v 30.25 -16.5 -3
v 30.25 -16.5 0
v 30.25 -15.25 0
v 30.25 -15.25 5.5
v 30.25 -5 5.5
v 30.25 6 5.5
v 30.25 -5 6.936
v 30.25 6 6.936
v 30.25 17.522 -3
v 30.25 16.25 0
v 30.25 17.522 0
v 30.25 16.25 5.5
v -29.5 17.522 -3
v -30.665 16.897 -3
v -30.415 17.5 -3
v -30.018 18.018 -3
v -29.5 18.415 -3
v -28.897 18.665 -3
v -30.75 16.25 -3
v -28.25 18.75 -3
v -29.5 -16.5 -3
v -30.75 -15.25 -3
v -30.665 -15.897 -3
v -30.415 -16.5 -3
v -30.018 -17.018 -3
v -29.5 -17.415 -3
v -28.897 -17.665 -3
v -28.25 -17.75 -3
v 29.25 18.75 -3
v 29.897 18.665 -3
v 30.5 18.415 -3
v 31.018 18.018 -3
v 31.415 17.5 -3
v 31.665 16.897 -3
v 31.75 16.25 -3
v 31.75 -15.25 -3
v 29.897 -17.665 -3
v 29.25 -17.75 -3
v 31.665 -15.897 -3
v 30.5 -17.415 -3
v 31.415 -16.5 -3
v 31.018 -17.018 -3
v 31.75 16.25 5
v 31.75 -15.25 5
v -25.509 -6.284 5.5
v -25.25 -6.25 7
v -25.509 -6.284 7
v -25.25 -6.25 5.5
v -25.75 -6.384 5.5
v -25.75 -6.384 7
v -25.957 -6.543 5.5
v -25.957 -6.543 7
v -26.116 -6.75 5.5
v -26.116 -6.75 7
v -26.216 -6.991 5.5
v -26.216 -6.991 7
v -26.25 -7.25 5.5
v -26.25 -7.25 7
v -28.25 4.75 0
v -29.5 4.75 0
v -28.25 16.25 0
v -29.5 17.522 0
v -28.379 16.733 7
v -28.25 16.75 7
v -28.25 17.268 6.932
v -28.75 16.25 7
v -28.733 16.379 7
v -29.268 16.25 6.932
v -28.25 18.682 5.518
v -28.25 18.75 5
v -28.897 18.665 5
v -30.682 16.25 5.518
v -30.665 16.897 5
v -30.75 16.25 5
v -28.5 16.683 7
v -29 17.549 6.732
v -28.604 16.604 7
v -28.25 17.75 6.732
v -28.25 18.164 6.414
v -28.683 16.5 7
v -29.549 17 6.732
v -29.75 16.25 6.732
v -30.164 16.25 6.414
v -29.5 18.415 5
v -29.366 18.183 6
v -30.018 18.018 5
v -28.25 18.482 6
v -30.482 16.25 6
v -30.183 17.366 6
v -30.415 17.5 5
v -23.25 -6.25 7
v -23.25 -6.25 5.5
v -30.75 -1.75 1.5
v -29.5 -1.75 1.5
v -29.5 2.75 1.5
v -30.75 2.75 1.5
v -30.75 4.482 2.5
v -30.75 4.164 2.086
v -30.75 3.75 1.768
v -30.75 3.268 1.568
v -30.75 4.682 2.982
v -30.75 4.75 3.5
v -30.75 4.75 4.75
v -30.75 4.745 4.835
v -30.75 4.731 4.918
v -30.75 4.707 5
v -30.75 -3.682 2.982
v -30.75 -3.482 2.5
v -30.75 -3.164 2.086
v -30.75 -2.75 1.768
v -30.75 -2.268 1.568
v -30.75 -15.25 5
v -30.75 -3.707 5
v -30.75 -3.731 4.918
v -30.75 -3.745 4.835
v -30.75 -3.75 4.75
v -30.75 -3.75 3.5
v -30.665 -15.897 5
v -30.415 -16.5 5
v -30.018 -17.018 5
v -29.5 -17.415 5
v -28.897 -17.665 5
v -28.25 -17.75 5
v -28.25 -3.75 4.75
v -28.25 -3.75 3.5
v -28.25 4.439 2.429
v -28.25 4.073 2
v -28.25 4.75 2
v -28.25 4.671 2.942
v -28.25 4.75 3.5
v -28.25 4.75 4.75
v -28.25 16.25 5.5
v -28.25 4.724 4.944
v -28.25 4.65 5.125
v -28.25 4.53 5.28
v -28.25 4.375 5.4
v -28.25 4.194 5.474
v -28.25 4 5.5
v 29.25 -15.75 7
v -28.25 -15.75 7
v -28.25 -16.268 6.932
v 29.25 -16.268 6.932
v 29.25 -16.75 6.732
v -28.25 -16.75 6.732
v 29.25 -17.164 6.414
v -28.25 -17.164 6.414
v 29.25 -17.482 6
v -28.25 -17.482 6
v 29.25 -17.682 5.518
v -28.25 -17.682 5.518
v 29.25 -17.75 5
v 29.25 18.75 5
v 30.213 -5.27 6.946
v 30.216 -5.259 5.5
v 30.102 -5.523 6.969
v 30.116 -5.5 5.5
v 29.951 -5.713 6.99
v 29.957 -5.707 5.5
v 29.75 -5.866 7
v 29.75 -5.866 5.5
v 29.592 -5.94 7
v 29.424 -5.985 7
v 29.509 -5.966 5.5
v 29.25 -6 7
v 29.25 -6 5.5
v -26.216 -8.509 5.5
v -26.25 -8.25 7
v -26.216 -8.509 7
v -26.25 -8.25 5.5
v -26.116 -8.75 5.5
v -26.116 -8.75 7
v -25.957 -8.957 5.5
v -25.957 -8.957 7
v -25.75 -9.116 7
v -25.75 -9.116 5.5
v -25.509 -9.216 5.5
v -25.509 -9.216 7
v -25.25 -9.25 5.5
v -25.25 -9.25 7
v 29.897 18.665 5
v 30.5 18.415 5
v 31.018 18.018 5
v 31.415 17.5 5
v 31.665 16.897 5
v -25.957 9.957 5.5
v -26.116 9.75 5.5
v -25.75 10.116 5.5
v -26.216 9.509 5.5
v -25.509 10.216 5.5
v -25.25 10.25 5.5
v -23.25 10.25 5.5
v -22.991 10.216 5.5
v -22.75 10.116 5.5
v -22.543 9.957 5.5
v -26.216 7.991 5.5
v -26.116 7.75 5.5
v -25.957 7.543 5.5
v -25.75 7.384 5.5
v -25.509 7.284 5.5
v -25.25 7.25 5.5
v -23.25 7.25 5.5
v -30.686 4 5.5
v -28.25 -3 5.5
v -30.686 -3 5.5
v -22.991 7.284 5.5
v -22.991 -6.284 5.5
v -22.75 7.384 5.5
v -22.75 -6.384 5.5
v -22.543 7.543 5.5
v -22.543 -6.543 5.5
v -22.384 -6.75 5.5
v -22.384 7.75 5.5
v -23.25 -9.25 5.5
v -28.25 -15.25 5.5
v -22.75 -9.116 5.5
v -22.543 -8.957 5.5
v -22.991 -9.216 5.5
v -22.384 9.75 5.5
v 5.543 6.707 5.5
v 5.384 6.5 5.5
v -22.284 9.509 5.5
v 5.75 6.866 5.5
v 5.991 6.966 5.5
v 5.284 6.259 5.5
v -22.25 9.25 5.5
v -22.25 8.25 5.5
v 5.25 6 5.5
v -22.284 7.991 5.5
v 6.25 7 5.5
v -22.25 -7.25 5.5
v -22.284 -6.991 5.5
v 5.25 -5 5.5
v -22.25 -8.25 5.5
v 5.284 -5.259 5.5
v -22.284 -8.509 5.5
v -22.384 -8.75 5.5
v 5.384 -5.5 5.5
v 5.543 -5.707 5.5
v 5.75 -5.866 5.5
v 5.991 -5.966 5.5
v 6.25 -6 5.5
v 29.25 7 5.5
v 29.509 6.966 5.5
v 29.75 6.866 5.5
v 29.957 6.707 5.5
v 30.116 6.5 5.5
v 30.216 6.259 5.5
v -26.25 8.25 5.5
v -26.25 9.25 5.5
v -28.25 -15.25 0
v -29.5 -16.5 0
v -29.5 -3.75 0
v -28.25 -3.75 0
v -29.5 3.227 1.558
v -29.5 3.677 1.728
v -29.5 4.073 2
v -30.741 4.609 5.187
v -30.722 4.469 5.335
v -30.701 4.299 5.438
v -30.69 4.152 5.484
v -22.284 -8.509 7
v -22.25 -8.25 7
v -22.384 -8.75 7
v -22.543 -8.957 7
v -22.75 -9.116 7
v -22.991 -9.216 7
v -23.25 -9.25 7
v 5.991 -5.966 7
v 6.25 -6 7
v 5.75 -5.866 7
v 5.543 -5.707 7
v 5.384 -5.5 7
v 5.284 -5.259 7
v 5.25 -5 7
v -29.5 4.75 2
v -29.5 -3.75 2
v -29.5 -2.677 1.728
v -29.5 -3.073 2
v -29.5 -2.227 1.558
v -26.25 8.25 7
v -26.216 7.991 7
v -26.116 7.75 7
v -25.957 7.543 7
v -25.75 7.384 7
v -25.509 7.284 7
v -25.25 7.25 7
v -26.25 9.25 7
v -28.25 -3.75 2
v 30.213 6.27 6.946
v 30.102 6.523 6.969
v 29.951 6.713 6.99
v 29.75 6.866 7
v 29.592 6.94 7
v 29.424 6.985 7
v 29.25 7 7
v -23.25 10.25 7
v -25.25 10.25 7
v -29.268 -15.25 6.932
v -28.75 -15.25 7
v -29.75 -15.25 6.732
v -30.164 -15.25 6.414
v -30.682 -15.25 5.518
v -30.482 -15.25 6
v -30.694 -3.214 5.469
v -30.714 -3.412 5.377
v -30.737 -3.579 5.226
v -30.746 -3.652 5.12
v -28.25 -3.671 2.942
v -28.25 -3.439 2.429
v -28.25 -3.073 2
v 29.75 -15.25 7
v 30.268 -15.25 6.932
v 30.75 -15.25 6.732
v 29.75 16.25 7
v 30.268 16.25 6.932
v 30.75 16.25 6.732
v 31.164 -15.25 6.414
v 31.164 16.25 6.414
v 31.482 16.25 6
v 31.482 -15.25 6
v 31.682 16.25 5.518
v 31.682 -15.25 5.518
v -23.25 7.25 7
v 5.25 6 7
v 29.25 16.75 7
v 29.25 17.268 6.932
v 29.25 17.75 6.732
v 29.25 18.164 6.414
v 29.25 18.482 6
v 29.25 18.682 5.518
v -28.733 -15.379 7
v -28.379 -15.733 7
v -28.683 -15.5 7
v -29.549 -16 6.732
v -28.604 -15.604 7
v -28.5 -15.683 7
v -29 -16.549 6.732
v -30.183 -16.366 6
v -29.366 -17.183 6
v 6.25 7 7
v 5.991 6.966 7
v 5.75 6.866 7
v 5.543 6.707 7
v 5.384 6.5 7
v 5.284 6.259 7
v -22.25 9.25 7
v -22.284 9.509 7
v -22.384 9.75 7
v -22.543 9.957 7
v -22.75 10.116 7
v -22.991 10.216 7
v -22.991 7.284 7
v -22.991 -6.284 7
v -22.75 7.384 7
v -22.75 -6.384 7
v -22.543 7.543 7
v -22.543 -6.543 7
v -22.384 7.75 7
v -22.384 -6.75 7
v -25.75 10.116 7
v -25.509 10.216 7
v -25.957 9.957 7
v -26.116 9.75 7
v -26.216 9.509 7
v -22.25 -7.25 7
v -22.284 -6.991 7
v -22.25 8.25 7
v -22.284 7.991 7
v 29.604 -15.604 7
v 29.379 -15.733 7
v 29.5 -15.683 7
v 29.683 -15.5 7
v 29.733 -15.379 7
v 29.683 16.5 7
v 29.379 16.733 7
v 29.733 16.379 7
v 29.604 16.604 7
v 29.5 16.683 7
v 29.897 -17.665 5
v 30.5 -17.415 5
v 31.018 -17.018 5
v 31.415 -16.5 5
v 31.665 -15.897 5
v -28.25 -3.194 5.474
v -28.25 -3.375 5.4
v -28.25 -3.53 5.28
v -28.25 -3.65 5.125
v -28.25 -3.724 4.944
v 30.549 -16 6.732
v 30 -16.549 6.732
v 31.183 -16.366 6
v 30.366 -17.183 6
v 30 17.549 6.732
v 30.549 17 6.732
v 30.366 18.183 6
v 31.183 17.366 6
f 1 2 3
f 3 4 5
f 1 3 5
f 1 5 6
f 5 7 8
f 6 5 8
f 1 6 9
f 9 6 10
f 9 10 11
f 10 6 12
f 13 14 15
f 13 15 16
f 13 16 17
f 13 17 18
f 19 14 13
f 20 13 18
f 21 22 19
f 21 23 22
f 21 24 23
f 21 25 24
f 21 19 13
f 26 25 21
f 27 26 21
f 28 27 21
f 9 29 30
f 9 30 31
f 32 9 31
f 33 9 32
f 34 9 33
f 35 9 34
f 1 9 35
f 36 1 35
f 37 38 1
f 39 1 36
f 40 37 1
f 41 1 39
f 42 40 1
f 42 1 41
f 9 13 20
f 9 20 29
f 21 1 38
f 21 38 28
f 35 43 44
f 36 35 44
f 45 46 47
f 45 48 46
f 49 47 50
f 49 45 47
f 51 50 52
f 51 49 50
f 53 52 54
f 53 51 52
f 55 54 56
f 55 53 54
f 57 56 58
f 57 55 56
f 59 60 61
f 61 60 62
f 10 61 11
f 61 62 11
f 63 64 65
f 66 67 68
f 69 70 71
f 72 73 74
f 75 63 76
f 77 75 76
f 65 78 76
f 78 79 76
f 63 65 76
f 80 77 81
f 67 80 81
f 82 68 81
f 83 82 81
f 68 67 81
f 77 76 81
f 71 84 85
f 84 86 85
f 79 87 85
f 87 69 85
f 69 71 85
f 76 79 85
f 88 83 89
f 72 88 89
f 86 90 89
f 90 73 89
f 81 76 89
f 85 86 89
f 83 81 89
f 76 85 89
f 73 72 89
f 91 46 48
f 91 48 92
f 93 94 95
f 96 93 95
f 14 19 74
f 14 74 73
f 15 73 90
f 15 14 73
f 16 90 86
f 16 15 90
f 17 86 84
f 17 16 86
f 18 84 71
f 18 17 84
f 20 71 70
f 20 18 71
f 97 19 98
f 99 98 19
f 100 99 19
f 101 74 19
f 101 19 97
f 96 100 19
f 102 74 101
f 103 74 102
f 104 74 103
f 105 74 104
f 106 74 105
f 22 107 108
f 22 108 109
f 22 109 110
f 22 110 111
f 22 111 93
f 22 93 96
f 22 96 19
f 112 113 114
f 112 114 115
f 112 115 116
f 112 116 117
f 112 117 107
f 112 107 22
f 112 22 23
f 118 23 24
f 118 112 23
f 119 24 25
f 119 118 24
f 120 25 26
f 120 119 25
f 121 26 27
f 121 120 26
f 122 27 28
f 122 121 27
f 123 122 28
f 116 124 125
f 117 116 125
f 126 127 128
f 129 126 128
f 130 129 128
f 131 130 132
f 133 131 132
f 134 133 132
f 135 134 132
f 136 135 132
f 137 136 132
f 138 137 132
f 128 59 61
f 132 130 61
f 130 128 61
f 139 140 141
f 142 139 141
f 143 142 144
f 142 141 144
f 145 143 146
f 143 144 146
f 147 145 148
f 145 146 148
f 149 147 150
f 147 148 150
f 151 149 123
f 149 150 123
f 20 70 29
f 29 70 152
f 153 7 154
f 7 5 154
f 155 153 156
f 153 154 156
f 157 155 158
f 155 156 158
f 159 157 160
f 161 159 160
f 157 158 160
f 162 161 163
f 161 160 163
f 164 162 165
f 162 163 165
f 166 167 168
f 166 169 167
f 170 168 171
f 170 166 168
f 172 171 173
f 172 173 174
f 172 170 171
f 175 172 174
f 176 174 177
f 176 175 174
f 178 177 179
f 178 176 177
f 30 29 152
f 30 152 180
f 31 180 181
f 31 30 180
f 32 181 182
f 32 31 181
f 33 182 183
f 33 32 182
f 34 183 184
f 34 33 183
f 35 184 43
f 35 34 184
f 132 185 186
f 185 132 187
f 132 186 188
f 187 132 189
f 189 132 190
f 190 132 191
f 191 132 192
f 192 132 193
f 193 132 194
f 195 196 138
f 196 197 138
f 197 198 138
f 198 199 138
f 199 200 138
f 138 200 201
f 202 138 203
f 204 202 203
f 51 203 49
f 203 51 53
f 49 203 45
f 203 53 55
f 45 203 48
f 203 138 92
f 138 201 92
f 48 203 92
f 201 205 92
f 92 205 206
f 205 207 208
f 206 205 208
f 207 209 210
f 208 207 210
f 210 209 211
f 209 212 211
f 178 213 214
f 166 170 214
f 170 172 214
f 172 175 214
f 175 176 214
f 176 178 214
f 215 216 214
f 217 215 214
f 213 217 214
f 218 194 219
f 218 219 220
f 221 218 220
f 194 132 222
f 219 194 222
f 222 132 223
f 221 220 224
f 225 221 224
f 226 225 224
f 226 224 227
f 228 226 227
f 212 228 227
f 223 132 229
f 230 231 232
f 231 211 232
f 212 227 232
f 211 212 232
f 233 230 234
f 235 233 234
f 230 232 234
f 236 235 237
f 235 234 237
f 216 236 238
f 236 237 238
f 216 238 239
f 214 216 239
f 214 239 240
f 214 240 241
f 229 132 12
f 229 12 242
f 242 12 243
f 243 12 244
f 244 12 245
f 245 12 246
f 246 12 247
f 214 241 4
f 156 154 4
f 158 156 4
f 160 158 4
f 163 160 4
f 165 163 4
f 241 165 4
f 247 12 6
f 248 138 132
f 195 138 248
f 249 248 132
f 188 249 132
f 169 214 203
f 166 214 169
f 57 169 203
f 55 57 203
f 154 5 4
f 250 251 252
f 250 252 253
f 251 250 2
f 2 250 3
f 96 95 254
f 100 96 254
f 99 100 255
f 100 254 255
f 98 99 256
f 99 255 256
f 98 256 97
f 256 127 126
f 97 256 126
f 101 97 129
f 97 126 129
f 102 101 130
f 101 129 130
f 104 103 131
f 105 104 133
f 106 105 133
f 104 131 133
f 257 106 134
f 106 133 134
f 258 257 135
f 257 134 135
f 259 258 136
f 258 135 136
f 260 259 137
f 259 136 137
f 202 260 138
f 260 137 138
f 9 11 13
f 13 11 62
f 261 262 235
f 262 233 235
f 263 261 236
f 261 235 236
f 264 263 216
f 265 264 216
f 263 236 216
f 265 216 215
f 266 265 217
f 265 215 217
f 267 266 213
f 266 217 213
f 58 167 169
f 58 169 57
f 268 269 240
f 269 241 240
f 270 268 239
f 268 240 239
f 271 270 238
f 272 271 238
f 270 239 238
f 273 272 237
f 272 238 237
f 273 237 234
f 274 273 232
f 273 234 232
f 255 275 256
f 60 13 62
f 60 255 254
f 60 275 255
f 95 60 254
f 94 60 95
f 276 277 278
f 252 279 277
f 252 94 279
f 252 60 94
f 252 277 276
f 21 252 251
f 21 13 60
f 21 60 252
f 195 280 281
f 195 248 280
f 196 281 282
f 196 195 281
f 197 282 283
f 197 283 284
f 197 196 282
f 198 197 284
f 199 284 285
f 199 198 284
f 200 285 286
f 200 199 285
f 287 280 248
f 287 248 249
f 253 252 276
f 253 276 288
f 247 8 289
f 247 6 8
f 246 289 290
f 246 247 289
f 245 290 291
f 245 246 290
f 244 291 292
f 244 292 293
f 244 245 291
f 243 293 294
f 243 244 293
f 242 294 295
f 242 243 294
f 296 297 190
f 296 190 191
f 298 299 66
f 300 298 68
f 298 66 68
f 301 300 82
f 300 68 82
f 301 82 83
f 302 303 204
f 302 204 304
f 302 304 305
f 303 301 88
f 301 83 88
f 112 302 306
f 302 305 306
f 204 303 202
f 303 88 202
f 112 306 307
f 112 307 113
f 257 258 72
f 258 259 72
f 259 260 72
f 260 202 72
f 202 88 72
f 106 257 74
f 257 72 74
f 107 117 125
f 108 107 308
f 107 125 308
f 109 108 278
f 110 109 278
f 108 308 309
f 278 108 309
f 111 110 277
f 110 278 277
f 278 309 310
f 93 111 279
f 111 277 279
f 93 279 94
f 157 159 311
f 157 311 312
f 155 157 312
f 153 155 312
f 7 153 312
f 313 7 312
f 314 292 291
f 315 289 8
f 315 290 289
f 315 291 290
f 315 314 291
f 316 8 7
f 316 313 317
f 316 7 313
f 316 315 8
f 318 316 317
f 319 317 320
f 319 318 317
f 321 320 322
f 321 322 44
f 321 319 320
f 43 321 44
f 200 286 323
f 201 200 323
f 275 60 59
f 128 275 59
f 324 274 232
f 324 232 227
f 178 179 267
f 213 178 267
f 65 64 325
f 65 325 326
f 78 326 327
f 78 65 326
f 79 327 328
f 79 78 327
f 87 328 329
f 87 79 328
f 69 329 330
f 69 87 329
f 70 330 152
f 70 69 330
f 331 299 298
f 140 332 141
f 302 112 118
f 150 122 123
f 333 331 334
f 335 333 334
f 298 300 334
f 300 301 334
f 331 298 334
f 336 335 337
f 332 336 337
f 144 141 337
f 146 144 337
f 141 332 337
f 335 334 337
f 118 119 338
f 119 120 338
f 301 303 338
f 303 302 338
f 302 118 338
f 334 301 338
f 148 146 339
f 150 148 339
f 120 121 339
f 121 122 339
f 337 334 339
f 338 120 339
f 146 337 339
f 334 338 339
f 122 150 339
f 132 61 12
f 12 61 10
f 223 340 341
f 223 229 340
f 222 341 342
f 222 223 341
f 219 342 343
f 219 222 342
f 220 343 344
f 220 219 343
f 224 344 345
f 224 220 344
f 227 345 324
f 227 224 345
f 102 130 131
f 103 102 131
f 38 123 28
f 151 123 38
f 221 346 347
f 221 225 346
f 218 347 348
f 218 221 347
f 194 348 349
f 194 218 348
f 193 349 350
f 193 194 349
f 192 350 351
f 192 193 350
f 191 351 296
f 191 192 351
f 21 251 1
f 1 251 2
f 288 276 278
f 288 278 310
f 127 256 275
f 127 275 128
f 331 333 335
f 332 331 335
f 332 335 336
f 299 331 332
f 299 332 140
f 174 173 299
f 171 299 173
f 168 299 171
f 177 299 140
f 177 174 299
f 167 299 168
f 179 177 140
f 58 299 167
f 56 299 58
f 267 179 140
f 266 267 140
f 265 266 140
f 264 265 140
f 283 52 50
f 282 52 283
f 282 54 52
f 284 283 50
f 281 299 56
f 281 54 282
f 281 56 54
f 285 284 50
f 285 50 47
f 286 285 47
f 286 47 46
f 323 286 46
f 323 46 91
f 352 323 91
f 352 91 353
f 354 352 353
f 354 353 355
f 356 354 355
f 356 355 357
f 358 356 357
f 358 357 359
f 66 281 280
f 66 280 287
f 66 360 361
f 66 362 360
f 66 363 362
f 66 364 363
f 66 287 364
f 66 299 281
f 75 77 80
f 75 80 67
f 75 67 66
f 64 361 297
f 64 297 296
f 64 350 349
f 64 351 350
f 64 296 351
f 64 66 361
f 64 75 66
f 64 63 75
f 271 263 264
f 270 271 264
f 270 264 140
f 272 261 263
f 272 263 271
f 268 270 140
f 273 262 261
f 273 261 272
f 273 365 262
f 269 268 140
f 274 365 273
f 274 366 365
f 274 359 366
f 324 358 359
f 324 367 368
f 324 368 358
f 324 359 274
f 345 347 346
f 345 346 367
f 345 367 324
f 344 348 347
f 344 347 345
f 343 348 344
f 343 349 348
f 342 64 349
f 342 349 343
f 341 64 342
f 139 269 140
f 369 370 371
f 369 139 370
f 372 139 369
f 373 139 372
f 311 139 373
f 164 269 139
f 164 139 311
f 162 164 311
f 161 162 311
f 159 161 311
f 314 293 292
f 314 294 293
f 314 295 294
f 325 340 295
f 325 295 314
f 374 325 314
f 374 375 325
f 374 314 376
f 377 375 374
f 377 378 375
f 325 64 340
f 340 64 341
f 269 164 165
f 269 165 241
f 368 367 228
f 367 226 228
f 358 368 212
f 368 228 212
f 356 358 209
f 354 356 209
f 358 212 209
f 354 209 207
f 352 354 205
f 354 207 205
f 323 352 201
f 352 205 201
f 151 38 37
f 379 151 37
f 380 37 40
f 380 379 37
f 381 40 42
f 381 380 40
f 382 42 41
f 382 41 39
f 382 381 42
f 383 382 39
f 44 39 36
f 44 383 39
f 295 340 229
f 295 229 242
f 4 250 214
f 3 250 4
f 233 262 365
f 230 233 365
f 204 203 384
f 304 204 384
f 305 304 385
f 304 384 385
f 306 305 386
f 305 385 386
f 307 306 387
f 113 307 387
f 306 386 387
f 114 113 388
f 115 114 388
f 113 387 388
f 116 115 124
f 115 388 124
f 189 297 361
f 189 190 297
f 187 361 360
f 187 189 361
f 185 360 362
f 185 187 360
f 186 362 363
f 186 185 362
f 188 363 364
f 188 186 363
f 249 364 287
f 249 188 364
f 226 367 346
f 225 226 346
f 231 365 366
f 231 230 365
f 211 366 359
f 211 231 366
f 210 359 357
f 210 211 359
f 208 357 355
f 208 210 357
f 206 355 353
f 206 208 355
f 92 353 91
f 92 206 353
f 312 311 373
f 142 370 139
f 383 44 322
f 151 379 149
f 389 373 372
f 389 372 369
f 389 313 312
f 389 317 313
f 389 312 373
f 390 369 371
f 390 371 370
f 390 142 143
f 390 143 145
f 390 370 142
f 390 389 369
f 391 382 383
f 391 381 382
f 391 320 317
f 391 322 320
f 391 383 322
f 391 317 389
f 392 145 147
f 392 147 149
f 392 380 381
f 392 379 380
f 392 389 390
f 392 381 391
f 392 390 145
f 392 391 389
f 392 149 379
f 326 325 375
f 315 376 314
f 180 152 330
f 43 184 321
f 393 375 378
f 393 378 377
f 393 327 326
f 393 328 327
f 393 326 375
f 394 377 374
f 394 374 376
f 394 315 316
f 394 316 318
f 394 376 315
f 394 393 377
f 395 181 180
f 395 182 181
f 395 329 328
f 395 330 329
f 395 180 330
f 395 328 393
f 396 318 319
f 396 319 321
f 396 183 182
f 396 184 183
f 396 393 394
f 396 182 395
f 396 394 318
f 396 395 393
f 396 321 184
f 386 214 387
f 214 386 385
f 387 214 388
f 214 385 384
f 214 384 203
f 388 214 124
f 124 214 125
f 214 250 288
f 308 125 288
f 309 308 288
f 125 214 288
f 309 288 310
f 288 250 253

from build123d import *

# Parameters (mm, degrees)
F0_W          = 62.5
F0_H          = 36.5
F0_W_2        = 58.5
F0_H_2        = 31.5
F1_DEPTH      = 7
F2_W          = 4
F2_H          = 3
F3_DEPTH      = 1.5
F4_W          = 62.5
F4_H          = 36.5
F5_DEPTH      = 3
F7_DEPTH      = 2.5
F8_R          = 2.5
F9_R          = 1
F10_R         = 1
F11_T1_DEPTH  = 57.5
F11_T3_DEPTH  = 31.5
F11_T6_ANGLE  = 90
F11_T8_ANGLE  = 90
F11_T10_ANGLE = 90
F11_T12_ANGLE = 90
F12_W         = 1.25
F12_H         = 8.5
F13_DEPTH     = 2


# Not quite as in the source:
# - a fillet or chamfer that OpenCascade refuses, or shapes differently, is made with other operations: its cross-section is extruded or revolved along the edge and cut away or added


with BuildPart() as f1:
    # F0 (on Top) → F1 (new body)
    with BuildSketch(Plane.XY):
        with Locations((0.5, 0.5)):
            Rectangle(F0_W, F0_H)
        with Locations((1, 0.5)):
            Rectangle(F0_W_2, F0_H_2, mode=Mode.SUBTRACT)
    extrude(amount=F1_DEPTH)

    # F2 (on face) → F3 (join)
    with BuildSketch(Plane.XY.offset(7)):
        Polygon((30.25, 16.25), (-28.25, 16.25), (-28.25, -15.25), (30.25, -15.25), (30.25, -6), (5.25, -6), (5.25, 7), (30.25, 7), align=None)
        with Locations((-24.25, -7.75)):
            Rectangle(F2_W, F2_H, mode=Mode.SUBTRACT)
        with Locations((-24.25, 8.75)):
            Rectangle(F2_W, F2_H, mode=Mode.SUBTRACT)
    extrude(amount=-F3_DEPTH)

    # F4 (on face) → F5 (join)
    with BuildSketch(Plane(origin=(0, 0, 0), x_dir=(1, 0, 0), z_dir=(0, 0, -1))):
        with Locations((0.5, -0.5)):
            Rectangle(F4_W, F4_H)
        Polygon((-29.5, -17.522141248), (-29.5, 16.5), (30.25, 16.5), (30.25, 15.25), (30.25, -16.25), (30.25, -17.522141248), align=None, mode=Mode.SUBTRACT)
    extrude(amount=F5_DEPTH)

    # F6 (on face) → F7 (cut)
    with BuildSketch(Plane.YZ.offset(-28.25)):
        with BuildLine():
            Line((4, 5.5), (-3, 5.5))
            ThreePointArc((-3, 5.5), (-3.5303300859, 5.2803300859), (-3.75, 4.75))
            Line((-3.75, 4.75), (-3.75, 3.5))
            ThreePointArc((-3.75, 3.5), (-3.1642135624, 2.0857864376), (-1.75, 1.5))
            Line((-1.75, 1.5), (2.75, 1.5))
            ThreePointArc((2.75, 1.5), (4.1642135624, 2.0857864376), (4.75, 3.5))
            Line((4.75, 3.5), (4.75, 4.75))
            ThreePointArc((4.75, 4.75), (4.5303300859, 5.2803300859), (4, 5.5))
        make_face()
    extrude(amount=-F7_DEPTH, mode=Mode.SUBTRACT)

    # F8
    f8_edges = [f1.edges().sort_by_distance(p)[0] for p in [
        (-30.75, 18.75, 2),
        (-30.75, -17.75, 2),
        (31.75, 18.75, 2),
        (31.75, -17.75, 2),
    ]]
    fillet(f8_edges, radius=F8_R)

    # F9
    f9_edges = [f1.edges().sort_by_distance(p)[0] for p in [
        (5.25, 7, 6.25),
        (30.25, 7, 6.25),
        (30.25, -6, 6.25),
        (5.25, -6, 6.25),
    ]]
    fillet(f9_edges, radius=F9_R)

    # F10
    f10_edges = [f1.edges().sort_by_distance(p)[0] for p in [
        (-22.25, 10.25, 6.25),
        (-26.25, 10.25, 6.25),
        (-26.25, 7.25, 6.25),
        (-22.25, 7.25, 6.25),
        (-26.25, -6.25, 6.25),
        (-22.25, -6.25, 6.25),
        (-22.25, -9.25, 6.25),
        (-26.25, -9.25, 6.25),
    ]]
    fillet(f10_edges, radius=F10_R)

    # F11: fillet of radius 2 on 8 edges, made by hand

    # F11_s2 → F11_t1 (cut)
    with BuildSketch(Plane.YZ.offset(-28.25)):
        with BuildLine():
            ThreePointArc((-15.75, 7), (-17.1642135624, 6.4142135624), (-17.75, 5))
            Line((-17.75, 5), (-17.75, 7))
            Line((-17.75, 7), (-15.75, 7))
        make_face()
        with BuildLine():
            ThreePointArc((16.75, 7), (18.1642135624, 6.4142135624), (18.75, 5))
            Line((18.75, 5), (18.75, 7))
            Line((18.75, 7), (16.75, 7))
        make_face()
    extrude(amount=F11_T1_DEPTH, mode=Mode.SUBTRACT)

    # F11_s4 → F11_t3 (cut)
    with BuildSketch(Plane.XZ.offset(-16.25)):
        with BuildLine():
            ThreePointArc((29.75, 7), (31.1642135624, 6.4142135624), (31.75, 5))
            Line((31.75, 5), (31.75, 7))
            Line((31.75, 7), (29.75, 7))
        make_face()
        with BuildLine():
            ThreePointArc((-28.75, 7), (-30.1642135624, 6.4142135624), (-30.75, 5))
            Line((-30.75, 5), (-30.75, 7))
            Line((-30.75, 7), (-28.75, 7))
        make_face()
    extrude(amount=F11_T3_DEPTH, mode=Mode.SUBTRACT)

    # F11_s5 → F11_t6 (revolve, cut)
    with BuildSketch(Plane.YZ.offset(29.25)):
        with BuildLine():
            ThreePointArc((16.75, 7), (18.1642135624, 6.4142135624), (18.75, 5))
            Line((18.75, 5), (18.75, 7))
            Line((18.75, 7), (16.75, 7))
        make_face()
    revolve(axis=Axis((29.25, 16.25, 7), (0, 0, -1)), revolution_arc=F11_T6_ANGLE, mode=Mode.SUBTRACT)

    # F11_s7 → F11_t8 (revolve, cut)
    with BuildSketch(Plane.YZ.offset(-28.25)):
        with BuildLine():
            ThreePointArc((16.75, 7), (18.1642135624, 6.4142135624), (18.75, 5))
            Line((18.75, 5), (18.75, 7))
            Line((18.75, 7), (16.75, 7))
        make_face()
    revolve(axis=Axis((-28.25, 16.25, 7), (0, 0, 1)), revolution_arc=F11_T8_ANGLE, mode=Mode.SUBTRACT)

    # F11_s9 → F11_t10 (revolve, cut)
    with BuildSketch(Plane.XZ.offset(15.25)):
        with BuildLine():
            ThreePointArc((29.75, 7), (31.1642135624, 6.4142135624), (31.75, 5))
            Line((31.75, 5), (31.75, 7))
            Line((31.75, 7), (29.75, 7))
        make_face()
    revolve(axis=Axis((29.25, -15.25, 7), (0, 0, -1)), revolution_arc=F11_T10_ANGLE, mode=Mode.SUBTRACT)

    # F11_s11 → F11_t12 (revolve, cut)
    with BuildSketch(Plane.XZ.offset(15.25)):
        with BuildLine():
            ThreePointArc((-28.75, 7), (-30.1642135624, 6.4142135624), (-30.75, 5))
            Line((-30.75, 5), (-30.75, 7))
            Line((-30.75, 7), (-28.75, 7))
        make_face()
    revolve(axis=Axis((-28.25, -15.25, 7), (0, 0, 1)), revolution_arc=F11_T12_ANGLE, mode=Mode.SUBTRACT)

    # F12 (on face) → F13 (cut)
    with BuildSketch(Plane(origin=(0, 0, 0), x_dir=(1, 0, 0), z_dir=(0, 0, -1))):
        with Locations((-28.875, -0.5)):
            Rectangle(F12_W, F12_H)
    extrude(amount=-F13_DEPTH, mode=Mode.SUBTRACT)


solid = f1.part
